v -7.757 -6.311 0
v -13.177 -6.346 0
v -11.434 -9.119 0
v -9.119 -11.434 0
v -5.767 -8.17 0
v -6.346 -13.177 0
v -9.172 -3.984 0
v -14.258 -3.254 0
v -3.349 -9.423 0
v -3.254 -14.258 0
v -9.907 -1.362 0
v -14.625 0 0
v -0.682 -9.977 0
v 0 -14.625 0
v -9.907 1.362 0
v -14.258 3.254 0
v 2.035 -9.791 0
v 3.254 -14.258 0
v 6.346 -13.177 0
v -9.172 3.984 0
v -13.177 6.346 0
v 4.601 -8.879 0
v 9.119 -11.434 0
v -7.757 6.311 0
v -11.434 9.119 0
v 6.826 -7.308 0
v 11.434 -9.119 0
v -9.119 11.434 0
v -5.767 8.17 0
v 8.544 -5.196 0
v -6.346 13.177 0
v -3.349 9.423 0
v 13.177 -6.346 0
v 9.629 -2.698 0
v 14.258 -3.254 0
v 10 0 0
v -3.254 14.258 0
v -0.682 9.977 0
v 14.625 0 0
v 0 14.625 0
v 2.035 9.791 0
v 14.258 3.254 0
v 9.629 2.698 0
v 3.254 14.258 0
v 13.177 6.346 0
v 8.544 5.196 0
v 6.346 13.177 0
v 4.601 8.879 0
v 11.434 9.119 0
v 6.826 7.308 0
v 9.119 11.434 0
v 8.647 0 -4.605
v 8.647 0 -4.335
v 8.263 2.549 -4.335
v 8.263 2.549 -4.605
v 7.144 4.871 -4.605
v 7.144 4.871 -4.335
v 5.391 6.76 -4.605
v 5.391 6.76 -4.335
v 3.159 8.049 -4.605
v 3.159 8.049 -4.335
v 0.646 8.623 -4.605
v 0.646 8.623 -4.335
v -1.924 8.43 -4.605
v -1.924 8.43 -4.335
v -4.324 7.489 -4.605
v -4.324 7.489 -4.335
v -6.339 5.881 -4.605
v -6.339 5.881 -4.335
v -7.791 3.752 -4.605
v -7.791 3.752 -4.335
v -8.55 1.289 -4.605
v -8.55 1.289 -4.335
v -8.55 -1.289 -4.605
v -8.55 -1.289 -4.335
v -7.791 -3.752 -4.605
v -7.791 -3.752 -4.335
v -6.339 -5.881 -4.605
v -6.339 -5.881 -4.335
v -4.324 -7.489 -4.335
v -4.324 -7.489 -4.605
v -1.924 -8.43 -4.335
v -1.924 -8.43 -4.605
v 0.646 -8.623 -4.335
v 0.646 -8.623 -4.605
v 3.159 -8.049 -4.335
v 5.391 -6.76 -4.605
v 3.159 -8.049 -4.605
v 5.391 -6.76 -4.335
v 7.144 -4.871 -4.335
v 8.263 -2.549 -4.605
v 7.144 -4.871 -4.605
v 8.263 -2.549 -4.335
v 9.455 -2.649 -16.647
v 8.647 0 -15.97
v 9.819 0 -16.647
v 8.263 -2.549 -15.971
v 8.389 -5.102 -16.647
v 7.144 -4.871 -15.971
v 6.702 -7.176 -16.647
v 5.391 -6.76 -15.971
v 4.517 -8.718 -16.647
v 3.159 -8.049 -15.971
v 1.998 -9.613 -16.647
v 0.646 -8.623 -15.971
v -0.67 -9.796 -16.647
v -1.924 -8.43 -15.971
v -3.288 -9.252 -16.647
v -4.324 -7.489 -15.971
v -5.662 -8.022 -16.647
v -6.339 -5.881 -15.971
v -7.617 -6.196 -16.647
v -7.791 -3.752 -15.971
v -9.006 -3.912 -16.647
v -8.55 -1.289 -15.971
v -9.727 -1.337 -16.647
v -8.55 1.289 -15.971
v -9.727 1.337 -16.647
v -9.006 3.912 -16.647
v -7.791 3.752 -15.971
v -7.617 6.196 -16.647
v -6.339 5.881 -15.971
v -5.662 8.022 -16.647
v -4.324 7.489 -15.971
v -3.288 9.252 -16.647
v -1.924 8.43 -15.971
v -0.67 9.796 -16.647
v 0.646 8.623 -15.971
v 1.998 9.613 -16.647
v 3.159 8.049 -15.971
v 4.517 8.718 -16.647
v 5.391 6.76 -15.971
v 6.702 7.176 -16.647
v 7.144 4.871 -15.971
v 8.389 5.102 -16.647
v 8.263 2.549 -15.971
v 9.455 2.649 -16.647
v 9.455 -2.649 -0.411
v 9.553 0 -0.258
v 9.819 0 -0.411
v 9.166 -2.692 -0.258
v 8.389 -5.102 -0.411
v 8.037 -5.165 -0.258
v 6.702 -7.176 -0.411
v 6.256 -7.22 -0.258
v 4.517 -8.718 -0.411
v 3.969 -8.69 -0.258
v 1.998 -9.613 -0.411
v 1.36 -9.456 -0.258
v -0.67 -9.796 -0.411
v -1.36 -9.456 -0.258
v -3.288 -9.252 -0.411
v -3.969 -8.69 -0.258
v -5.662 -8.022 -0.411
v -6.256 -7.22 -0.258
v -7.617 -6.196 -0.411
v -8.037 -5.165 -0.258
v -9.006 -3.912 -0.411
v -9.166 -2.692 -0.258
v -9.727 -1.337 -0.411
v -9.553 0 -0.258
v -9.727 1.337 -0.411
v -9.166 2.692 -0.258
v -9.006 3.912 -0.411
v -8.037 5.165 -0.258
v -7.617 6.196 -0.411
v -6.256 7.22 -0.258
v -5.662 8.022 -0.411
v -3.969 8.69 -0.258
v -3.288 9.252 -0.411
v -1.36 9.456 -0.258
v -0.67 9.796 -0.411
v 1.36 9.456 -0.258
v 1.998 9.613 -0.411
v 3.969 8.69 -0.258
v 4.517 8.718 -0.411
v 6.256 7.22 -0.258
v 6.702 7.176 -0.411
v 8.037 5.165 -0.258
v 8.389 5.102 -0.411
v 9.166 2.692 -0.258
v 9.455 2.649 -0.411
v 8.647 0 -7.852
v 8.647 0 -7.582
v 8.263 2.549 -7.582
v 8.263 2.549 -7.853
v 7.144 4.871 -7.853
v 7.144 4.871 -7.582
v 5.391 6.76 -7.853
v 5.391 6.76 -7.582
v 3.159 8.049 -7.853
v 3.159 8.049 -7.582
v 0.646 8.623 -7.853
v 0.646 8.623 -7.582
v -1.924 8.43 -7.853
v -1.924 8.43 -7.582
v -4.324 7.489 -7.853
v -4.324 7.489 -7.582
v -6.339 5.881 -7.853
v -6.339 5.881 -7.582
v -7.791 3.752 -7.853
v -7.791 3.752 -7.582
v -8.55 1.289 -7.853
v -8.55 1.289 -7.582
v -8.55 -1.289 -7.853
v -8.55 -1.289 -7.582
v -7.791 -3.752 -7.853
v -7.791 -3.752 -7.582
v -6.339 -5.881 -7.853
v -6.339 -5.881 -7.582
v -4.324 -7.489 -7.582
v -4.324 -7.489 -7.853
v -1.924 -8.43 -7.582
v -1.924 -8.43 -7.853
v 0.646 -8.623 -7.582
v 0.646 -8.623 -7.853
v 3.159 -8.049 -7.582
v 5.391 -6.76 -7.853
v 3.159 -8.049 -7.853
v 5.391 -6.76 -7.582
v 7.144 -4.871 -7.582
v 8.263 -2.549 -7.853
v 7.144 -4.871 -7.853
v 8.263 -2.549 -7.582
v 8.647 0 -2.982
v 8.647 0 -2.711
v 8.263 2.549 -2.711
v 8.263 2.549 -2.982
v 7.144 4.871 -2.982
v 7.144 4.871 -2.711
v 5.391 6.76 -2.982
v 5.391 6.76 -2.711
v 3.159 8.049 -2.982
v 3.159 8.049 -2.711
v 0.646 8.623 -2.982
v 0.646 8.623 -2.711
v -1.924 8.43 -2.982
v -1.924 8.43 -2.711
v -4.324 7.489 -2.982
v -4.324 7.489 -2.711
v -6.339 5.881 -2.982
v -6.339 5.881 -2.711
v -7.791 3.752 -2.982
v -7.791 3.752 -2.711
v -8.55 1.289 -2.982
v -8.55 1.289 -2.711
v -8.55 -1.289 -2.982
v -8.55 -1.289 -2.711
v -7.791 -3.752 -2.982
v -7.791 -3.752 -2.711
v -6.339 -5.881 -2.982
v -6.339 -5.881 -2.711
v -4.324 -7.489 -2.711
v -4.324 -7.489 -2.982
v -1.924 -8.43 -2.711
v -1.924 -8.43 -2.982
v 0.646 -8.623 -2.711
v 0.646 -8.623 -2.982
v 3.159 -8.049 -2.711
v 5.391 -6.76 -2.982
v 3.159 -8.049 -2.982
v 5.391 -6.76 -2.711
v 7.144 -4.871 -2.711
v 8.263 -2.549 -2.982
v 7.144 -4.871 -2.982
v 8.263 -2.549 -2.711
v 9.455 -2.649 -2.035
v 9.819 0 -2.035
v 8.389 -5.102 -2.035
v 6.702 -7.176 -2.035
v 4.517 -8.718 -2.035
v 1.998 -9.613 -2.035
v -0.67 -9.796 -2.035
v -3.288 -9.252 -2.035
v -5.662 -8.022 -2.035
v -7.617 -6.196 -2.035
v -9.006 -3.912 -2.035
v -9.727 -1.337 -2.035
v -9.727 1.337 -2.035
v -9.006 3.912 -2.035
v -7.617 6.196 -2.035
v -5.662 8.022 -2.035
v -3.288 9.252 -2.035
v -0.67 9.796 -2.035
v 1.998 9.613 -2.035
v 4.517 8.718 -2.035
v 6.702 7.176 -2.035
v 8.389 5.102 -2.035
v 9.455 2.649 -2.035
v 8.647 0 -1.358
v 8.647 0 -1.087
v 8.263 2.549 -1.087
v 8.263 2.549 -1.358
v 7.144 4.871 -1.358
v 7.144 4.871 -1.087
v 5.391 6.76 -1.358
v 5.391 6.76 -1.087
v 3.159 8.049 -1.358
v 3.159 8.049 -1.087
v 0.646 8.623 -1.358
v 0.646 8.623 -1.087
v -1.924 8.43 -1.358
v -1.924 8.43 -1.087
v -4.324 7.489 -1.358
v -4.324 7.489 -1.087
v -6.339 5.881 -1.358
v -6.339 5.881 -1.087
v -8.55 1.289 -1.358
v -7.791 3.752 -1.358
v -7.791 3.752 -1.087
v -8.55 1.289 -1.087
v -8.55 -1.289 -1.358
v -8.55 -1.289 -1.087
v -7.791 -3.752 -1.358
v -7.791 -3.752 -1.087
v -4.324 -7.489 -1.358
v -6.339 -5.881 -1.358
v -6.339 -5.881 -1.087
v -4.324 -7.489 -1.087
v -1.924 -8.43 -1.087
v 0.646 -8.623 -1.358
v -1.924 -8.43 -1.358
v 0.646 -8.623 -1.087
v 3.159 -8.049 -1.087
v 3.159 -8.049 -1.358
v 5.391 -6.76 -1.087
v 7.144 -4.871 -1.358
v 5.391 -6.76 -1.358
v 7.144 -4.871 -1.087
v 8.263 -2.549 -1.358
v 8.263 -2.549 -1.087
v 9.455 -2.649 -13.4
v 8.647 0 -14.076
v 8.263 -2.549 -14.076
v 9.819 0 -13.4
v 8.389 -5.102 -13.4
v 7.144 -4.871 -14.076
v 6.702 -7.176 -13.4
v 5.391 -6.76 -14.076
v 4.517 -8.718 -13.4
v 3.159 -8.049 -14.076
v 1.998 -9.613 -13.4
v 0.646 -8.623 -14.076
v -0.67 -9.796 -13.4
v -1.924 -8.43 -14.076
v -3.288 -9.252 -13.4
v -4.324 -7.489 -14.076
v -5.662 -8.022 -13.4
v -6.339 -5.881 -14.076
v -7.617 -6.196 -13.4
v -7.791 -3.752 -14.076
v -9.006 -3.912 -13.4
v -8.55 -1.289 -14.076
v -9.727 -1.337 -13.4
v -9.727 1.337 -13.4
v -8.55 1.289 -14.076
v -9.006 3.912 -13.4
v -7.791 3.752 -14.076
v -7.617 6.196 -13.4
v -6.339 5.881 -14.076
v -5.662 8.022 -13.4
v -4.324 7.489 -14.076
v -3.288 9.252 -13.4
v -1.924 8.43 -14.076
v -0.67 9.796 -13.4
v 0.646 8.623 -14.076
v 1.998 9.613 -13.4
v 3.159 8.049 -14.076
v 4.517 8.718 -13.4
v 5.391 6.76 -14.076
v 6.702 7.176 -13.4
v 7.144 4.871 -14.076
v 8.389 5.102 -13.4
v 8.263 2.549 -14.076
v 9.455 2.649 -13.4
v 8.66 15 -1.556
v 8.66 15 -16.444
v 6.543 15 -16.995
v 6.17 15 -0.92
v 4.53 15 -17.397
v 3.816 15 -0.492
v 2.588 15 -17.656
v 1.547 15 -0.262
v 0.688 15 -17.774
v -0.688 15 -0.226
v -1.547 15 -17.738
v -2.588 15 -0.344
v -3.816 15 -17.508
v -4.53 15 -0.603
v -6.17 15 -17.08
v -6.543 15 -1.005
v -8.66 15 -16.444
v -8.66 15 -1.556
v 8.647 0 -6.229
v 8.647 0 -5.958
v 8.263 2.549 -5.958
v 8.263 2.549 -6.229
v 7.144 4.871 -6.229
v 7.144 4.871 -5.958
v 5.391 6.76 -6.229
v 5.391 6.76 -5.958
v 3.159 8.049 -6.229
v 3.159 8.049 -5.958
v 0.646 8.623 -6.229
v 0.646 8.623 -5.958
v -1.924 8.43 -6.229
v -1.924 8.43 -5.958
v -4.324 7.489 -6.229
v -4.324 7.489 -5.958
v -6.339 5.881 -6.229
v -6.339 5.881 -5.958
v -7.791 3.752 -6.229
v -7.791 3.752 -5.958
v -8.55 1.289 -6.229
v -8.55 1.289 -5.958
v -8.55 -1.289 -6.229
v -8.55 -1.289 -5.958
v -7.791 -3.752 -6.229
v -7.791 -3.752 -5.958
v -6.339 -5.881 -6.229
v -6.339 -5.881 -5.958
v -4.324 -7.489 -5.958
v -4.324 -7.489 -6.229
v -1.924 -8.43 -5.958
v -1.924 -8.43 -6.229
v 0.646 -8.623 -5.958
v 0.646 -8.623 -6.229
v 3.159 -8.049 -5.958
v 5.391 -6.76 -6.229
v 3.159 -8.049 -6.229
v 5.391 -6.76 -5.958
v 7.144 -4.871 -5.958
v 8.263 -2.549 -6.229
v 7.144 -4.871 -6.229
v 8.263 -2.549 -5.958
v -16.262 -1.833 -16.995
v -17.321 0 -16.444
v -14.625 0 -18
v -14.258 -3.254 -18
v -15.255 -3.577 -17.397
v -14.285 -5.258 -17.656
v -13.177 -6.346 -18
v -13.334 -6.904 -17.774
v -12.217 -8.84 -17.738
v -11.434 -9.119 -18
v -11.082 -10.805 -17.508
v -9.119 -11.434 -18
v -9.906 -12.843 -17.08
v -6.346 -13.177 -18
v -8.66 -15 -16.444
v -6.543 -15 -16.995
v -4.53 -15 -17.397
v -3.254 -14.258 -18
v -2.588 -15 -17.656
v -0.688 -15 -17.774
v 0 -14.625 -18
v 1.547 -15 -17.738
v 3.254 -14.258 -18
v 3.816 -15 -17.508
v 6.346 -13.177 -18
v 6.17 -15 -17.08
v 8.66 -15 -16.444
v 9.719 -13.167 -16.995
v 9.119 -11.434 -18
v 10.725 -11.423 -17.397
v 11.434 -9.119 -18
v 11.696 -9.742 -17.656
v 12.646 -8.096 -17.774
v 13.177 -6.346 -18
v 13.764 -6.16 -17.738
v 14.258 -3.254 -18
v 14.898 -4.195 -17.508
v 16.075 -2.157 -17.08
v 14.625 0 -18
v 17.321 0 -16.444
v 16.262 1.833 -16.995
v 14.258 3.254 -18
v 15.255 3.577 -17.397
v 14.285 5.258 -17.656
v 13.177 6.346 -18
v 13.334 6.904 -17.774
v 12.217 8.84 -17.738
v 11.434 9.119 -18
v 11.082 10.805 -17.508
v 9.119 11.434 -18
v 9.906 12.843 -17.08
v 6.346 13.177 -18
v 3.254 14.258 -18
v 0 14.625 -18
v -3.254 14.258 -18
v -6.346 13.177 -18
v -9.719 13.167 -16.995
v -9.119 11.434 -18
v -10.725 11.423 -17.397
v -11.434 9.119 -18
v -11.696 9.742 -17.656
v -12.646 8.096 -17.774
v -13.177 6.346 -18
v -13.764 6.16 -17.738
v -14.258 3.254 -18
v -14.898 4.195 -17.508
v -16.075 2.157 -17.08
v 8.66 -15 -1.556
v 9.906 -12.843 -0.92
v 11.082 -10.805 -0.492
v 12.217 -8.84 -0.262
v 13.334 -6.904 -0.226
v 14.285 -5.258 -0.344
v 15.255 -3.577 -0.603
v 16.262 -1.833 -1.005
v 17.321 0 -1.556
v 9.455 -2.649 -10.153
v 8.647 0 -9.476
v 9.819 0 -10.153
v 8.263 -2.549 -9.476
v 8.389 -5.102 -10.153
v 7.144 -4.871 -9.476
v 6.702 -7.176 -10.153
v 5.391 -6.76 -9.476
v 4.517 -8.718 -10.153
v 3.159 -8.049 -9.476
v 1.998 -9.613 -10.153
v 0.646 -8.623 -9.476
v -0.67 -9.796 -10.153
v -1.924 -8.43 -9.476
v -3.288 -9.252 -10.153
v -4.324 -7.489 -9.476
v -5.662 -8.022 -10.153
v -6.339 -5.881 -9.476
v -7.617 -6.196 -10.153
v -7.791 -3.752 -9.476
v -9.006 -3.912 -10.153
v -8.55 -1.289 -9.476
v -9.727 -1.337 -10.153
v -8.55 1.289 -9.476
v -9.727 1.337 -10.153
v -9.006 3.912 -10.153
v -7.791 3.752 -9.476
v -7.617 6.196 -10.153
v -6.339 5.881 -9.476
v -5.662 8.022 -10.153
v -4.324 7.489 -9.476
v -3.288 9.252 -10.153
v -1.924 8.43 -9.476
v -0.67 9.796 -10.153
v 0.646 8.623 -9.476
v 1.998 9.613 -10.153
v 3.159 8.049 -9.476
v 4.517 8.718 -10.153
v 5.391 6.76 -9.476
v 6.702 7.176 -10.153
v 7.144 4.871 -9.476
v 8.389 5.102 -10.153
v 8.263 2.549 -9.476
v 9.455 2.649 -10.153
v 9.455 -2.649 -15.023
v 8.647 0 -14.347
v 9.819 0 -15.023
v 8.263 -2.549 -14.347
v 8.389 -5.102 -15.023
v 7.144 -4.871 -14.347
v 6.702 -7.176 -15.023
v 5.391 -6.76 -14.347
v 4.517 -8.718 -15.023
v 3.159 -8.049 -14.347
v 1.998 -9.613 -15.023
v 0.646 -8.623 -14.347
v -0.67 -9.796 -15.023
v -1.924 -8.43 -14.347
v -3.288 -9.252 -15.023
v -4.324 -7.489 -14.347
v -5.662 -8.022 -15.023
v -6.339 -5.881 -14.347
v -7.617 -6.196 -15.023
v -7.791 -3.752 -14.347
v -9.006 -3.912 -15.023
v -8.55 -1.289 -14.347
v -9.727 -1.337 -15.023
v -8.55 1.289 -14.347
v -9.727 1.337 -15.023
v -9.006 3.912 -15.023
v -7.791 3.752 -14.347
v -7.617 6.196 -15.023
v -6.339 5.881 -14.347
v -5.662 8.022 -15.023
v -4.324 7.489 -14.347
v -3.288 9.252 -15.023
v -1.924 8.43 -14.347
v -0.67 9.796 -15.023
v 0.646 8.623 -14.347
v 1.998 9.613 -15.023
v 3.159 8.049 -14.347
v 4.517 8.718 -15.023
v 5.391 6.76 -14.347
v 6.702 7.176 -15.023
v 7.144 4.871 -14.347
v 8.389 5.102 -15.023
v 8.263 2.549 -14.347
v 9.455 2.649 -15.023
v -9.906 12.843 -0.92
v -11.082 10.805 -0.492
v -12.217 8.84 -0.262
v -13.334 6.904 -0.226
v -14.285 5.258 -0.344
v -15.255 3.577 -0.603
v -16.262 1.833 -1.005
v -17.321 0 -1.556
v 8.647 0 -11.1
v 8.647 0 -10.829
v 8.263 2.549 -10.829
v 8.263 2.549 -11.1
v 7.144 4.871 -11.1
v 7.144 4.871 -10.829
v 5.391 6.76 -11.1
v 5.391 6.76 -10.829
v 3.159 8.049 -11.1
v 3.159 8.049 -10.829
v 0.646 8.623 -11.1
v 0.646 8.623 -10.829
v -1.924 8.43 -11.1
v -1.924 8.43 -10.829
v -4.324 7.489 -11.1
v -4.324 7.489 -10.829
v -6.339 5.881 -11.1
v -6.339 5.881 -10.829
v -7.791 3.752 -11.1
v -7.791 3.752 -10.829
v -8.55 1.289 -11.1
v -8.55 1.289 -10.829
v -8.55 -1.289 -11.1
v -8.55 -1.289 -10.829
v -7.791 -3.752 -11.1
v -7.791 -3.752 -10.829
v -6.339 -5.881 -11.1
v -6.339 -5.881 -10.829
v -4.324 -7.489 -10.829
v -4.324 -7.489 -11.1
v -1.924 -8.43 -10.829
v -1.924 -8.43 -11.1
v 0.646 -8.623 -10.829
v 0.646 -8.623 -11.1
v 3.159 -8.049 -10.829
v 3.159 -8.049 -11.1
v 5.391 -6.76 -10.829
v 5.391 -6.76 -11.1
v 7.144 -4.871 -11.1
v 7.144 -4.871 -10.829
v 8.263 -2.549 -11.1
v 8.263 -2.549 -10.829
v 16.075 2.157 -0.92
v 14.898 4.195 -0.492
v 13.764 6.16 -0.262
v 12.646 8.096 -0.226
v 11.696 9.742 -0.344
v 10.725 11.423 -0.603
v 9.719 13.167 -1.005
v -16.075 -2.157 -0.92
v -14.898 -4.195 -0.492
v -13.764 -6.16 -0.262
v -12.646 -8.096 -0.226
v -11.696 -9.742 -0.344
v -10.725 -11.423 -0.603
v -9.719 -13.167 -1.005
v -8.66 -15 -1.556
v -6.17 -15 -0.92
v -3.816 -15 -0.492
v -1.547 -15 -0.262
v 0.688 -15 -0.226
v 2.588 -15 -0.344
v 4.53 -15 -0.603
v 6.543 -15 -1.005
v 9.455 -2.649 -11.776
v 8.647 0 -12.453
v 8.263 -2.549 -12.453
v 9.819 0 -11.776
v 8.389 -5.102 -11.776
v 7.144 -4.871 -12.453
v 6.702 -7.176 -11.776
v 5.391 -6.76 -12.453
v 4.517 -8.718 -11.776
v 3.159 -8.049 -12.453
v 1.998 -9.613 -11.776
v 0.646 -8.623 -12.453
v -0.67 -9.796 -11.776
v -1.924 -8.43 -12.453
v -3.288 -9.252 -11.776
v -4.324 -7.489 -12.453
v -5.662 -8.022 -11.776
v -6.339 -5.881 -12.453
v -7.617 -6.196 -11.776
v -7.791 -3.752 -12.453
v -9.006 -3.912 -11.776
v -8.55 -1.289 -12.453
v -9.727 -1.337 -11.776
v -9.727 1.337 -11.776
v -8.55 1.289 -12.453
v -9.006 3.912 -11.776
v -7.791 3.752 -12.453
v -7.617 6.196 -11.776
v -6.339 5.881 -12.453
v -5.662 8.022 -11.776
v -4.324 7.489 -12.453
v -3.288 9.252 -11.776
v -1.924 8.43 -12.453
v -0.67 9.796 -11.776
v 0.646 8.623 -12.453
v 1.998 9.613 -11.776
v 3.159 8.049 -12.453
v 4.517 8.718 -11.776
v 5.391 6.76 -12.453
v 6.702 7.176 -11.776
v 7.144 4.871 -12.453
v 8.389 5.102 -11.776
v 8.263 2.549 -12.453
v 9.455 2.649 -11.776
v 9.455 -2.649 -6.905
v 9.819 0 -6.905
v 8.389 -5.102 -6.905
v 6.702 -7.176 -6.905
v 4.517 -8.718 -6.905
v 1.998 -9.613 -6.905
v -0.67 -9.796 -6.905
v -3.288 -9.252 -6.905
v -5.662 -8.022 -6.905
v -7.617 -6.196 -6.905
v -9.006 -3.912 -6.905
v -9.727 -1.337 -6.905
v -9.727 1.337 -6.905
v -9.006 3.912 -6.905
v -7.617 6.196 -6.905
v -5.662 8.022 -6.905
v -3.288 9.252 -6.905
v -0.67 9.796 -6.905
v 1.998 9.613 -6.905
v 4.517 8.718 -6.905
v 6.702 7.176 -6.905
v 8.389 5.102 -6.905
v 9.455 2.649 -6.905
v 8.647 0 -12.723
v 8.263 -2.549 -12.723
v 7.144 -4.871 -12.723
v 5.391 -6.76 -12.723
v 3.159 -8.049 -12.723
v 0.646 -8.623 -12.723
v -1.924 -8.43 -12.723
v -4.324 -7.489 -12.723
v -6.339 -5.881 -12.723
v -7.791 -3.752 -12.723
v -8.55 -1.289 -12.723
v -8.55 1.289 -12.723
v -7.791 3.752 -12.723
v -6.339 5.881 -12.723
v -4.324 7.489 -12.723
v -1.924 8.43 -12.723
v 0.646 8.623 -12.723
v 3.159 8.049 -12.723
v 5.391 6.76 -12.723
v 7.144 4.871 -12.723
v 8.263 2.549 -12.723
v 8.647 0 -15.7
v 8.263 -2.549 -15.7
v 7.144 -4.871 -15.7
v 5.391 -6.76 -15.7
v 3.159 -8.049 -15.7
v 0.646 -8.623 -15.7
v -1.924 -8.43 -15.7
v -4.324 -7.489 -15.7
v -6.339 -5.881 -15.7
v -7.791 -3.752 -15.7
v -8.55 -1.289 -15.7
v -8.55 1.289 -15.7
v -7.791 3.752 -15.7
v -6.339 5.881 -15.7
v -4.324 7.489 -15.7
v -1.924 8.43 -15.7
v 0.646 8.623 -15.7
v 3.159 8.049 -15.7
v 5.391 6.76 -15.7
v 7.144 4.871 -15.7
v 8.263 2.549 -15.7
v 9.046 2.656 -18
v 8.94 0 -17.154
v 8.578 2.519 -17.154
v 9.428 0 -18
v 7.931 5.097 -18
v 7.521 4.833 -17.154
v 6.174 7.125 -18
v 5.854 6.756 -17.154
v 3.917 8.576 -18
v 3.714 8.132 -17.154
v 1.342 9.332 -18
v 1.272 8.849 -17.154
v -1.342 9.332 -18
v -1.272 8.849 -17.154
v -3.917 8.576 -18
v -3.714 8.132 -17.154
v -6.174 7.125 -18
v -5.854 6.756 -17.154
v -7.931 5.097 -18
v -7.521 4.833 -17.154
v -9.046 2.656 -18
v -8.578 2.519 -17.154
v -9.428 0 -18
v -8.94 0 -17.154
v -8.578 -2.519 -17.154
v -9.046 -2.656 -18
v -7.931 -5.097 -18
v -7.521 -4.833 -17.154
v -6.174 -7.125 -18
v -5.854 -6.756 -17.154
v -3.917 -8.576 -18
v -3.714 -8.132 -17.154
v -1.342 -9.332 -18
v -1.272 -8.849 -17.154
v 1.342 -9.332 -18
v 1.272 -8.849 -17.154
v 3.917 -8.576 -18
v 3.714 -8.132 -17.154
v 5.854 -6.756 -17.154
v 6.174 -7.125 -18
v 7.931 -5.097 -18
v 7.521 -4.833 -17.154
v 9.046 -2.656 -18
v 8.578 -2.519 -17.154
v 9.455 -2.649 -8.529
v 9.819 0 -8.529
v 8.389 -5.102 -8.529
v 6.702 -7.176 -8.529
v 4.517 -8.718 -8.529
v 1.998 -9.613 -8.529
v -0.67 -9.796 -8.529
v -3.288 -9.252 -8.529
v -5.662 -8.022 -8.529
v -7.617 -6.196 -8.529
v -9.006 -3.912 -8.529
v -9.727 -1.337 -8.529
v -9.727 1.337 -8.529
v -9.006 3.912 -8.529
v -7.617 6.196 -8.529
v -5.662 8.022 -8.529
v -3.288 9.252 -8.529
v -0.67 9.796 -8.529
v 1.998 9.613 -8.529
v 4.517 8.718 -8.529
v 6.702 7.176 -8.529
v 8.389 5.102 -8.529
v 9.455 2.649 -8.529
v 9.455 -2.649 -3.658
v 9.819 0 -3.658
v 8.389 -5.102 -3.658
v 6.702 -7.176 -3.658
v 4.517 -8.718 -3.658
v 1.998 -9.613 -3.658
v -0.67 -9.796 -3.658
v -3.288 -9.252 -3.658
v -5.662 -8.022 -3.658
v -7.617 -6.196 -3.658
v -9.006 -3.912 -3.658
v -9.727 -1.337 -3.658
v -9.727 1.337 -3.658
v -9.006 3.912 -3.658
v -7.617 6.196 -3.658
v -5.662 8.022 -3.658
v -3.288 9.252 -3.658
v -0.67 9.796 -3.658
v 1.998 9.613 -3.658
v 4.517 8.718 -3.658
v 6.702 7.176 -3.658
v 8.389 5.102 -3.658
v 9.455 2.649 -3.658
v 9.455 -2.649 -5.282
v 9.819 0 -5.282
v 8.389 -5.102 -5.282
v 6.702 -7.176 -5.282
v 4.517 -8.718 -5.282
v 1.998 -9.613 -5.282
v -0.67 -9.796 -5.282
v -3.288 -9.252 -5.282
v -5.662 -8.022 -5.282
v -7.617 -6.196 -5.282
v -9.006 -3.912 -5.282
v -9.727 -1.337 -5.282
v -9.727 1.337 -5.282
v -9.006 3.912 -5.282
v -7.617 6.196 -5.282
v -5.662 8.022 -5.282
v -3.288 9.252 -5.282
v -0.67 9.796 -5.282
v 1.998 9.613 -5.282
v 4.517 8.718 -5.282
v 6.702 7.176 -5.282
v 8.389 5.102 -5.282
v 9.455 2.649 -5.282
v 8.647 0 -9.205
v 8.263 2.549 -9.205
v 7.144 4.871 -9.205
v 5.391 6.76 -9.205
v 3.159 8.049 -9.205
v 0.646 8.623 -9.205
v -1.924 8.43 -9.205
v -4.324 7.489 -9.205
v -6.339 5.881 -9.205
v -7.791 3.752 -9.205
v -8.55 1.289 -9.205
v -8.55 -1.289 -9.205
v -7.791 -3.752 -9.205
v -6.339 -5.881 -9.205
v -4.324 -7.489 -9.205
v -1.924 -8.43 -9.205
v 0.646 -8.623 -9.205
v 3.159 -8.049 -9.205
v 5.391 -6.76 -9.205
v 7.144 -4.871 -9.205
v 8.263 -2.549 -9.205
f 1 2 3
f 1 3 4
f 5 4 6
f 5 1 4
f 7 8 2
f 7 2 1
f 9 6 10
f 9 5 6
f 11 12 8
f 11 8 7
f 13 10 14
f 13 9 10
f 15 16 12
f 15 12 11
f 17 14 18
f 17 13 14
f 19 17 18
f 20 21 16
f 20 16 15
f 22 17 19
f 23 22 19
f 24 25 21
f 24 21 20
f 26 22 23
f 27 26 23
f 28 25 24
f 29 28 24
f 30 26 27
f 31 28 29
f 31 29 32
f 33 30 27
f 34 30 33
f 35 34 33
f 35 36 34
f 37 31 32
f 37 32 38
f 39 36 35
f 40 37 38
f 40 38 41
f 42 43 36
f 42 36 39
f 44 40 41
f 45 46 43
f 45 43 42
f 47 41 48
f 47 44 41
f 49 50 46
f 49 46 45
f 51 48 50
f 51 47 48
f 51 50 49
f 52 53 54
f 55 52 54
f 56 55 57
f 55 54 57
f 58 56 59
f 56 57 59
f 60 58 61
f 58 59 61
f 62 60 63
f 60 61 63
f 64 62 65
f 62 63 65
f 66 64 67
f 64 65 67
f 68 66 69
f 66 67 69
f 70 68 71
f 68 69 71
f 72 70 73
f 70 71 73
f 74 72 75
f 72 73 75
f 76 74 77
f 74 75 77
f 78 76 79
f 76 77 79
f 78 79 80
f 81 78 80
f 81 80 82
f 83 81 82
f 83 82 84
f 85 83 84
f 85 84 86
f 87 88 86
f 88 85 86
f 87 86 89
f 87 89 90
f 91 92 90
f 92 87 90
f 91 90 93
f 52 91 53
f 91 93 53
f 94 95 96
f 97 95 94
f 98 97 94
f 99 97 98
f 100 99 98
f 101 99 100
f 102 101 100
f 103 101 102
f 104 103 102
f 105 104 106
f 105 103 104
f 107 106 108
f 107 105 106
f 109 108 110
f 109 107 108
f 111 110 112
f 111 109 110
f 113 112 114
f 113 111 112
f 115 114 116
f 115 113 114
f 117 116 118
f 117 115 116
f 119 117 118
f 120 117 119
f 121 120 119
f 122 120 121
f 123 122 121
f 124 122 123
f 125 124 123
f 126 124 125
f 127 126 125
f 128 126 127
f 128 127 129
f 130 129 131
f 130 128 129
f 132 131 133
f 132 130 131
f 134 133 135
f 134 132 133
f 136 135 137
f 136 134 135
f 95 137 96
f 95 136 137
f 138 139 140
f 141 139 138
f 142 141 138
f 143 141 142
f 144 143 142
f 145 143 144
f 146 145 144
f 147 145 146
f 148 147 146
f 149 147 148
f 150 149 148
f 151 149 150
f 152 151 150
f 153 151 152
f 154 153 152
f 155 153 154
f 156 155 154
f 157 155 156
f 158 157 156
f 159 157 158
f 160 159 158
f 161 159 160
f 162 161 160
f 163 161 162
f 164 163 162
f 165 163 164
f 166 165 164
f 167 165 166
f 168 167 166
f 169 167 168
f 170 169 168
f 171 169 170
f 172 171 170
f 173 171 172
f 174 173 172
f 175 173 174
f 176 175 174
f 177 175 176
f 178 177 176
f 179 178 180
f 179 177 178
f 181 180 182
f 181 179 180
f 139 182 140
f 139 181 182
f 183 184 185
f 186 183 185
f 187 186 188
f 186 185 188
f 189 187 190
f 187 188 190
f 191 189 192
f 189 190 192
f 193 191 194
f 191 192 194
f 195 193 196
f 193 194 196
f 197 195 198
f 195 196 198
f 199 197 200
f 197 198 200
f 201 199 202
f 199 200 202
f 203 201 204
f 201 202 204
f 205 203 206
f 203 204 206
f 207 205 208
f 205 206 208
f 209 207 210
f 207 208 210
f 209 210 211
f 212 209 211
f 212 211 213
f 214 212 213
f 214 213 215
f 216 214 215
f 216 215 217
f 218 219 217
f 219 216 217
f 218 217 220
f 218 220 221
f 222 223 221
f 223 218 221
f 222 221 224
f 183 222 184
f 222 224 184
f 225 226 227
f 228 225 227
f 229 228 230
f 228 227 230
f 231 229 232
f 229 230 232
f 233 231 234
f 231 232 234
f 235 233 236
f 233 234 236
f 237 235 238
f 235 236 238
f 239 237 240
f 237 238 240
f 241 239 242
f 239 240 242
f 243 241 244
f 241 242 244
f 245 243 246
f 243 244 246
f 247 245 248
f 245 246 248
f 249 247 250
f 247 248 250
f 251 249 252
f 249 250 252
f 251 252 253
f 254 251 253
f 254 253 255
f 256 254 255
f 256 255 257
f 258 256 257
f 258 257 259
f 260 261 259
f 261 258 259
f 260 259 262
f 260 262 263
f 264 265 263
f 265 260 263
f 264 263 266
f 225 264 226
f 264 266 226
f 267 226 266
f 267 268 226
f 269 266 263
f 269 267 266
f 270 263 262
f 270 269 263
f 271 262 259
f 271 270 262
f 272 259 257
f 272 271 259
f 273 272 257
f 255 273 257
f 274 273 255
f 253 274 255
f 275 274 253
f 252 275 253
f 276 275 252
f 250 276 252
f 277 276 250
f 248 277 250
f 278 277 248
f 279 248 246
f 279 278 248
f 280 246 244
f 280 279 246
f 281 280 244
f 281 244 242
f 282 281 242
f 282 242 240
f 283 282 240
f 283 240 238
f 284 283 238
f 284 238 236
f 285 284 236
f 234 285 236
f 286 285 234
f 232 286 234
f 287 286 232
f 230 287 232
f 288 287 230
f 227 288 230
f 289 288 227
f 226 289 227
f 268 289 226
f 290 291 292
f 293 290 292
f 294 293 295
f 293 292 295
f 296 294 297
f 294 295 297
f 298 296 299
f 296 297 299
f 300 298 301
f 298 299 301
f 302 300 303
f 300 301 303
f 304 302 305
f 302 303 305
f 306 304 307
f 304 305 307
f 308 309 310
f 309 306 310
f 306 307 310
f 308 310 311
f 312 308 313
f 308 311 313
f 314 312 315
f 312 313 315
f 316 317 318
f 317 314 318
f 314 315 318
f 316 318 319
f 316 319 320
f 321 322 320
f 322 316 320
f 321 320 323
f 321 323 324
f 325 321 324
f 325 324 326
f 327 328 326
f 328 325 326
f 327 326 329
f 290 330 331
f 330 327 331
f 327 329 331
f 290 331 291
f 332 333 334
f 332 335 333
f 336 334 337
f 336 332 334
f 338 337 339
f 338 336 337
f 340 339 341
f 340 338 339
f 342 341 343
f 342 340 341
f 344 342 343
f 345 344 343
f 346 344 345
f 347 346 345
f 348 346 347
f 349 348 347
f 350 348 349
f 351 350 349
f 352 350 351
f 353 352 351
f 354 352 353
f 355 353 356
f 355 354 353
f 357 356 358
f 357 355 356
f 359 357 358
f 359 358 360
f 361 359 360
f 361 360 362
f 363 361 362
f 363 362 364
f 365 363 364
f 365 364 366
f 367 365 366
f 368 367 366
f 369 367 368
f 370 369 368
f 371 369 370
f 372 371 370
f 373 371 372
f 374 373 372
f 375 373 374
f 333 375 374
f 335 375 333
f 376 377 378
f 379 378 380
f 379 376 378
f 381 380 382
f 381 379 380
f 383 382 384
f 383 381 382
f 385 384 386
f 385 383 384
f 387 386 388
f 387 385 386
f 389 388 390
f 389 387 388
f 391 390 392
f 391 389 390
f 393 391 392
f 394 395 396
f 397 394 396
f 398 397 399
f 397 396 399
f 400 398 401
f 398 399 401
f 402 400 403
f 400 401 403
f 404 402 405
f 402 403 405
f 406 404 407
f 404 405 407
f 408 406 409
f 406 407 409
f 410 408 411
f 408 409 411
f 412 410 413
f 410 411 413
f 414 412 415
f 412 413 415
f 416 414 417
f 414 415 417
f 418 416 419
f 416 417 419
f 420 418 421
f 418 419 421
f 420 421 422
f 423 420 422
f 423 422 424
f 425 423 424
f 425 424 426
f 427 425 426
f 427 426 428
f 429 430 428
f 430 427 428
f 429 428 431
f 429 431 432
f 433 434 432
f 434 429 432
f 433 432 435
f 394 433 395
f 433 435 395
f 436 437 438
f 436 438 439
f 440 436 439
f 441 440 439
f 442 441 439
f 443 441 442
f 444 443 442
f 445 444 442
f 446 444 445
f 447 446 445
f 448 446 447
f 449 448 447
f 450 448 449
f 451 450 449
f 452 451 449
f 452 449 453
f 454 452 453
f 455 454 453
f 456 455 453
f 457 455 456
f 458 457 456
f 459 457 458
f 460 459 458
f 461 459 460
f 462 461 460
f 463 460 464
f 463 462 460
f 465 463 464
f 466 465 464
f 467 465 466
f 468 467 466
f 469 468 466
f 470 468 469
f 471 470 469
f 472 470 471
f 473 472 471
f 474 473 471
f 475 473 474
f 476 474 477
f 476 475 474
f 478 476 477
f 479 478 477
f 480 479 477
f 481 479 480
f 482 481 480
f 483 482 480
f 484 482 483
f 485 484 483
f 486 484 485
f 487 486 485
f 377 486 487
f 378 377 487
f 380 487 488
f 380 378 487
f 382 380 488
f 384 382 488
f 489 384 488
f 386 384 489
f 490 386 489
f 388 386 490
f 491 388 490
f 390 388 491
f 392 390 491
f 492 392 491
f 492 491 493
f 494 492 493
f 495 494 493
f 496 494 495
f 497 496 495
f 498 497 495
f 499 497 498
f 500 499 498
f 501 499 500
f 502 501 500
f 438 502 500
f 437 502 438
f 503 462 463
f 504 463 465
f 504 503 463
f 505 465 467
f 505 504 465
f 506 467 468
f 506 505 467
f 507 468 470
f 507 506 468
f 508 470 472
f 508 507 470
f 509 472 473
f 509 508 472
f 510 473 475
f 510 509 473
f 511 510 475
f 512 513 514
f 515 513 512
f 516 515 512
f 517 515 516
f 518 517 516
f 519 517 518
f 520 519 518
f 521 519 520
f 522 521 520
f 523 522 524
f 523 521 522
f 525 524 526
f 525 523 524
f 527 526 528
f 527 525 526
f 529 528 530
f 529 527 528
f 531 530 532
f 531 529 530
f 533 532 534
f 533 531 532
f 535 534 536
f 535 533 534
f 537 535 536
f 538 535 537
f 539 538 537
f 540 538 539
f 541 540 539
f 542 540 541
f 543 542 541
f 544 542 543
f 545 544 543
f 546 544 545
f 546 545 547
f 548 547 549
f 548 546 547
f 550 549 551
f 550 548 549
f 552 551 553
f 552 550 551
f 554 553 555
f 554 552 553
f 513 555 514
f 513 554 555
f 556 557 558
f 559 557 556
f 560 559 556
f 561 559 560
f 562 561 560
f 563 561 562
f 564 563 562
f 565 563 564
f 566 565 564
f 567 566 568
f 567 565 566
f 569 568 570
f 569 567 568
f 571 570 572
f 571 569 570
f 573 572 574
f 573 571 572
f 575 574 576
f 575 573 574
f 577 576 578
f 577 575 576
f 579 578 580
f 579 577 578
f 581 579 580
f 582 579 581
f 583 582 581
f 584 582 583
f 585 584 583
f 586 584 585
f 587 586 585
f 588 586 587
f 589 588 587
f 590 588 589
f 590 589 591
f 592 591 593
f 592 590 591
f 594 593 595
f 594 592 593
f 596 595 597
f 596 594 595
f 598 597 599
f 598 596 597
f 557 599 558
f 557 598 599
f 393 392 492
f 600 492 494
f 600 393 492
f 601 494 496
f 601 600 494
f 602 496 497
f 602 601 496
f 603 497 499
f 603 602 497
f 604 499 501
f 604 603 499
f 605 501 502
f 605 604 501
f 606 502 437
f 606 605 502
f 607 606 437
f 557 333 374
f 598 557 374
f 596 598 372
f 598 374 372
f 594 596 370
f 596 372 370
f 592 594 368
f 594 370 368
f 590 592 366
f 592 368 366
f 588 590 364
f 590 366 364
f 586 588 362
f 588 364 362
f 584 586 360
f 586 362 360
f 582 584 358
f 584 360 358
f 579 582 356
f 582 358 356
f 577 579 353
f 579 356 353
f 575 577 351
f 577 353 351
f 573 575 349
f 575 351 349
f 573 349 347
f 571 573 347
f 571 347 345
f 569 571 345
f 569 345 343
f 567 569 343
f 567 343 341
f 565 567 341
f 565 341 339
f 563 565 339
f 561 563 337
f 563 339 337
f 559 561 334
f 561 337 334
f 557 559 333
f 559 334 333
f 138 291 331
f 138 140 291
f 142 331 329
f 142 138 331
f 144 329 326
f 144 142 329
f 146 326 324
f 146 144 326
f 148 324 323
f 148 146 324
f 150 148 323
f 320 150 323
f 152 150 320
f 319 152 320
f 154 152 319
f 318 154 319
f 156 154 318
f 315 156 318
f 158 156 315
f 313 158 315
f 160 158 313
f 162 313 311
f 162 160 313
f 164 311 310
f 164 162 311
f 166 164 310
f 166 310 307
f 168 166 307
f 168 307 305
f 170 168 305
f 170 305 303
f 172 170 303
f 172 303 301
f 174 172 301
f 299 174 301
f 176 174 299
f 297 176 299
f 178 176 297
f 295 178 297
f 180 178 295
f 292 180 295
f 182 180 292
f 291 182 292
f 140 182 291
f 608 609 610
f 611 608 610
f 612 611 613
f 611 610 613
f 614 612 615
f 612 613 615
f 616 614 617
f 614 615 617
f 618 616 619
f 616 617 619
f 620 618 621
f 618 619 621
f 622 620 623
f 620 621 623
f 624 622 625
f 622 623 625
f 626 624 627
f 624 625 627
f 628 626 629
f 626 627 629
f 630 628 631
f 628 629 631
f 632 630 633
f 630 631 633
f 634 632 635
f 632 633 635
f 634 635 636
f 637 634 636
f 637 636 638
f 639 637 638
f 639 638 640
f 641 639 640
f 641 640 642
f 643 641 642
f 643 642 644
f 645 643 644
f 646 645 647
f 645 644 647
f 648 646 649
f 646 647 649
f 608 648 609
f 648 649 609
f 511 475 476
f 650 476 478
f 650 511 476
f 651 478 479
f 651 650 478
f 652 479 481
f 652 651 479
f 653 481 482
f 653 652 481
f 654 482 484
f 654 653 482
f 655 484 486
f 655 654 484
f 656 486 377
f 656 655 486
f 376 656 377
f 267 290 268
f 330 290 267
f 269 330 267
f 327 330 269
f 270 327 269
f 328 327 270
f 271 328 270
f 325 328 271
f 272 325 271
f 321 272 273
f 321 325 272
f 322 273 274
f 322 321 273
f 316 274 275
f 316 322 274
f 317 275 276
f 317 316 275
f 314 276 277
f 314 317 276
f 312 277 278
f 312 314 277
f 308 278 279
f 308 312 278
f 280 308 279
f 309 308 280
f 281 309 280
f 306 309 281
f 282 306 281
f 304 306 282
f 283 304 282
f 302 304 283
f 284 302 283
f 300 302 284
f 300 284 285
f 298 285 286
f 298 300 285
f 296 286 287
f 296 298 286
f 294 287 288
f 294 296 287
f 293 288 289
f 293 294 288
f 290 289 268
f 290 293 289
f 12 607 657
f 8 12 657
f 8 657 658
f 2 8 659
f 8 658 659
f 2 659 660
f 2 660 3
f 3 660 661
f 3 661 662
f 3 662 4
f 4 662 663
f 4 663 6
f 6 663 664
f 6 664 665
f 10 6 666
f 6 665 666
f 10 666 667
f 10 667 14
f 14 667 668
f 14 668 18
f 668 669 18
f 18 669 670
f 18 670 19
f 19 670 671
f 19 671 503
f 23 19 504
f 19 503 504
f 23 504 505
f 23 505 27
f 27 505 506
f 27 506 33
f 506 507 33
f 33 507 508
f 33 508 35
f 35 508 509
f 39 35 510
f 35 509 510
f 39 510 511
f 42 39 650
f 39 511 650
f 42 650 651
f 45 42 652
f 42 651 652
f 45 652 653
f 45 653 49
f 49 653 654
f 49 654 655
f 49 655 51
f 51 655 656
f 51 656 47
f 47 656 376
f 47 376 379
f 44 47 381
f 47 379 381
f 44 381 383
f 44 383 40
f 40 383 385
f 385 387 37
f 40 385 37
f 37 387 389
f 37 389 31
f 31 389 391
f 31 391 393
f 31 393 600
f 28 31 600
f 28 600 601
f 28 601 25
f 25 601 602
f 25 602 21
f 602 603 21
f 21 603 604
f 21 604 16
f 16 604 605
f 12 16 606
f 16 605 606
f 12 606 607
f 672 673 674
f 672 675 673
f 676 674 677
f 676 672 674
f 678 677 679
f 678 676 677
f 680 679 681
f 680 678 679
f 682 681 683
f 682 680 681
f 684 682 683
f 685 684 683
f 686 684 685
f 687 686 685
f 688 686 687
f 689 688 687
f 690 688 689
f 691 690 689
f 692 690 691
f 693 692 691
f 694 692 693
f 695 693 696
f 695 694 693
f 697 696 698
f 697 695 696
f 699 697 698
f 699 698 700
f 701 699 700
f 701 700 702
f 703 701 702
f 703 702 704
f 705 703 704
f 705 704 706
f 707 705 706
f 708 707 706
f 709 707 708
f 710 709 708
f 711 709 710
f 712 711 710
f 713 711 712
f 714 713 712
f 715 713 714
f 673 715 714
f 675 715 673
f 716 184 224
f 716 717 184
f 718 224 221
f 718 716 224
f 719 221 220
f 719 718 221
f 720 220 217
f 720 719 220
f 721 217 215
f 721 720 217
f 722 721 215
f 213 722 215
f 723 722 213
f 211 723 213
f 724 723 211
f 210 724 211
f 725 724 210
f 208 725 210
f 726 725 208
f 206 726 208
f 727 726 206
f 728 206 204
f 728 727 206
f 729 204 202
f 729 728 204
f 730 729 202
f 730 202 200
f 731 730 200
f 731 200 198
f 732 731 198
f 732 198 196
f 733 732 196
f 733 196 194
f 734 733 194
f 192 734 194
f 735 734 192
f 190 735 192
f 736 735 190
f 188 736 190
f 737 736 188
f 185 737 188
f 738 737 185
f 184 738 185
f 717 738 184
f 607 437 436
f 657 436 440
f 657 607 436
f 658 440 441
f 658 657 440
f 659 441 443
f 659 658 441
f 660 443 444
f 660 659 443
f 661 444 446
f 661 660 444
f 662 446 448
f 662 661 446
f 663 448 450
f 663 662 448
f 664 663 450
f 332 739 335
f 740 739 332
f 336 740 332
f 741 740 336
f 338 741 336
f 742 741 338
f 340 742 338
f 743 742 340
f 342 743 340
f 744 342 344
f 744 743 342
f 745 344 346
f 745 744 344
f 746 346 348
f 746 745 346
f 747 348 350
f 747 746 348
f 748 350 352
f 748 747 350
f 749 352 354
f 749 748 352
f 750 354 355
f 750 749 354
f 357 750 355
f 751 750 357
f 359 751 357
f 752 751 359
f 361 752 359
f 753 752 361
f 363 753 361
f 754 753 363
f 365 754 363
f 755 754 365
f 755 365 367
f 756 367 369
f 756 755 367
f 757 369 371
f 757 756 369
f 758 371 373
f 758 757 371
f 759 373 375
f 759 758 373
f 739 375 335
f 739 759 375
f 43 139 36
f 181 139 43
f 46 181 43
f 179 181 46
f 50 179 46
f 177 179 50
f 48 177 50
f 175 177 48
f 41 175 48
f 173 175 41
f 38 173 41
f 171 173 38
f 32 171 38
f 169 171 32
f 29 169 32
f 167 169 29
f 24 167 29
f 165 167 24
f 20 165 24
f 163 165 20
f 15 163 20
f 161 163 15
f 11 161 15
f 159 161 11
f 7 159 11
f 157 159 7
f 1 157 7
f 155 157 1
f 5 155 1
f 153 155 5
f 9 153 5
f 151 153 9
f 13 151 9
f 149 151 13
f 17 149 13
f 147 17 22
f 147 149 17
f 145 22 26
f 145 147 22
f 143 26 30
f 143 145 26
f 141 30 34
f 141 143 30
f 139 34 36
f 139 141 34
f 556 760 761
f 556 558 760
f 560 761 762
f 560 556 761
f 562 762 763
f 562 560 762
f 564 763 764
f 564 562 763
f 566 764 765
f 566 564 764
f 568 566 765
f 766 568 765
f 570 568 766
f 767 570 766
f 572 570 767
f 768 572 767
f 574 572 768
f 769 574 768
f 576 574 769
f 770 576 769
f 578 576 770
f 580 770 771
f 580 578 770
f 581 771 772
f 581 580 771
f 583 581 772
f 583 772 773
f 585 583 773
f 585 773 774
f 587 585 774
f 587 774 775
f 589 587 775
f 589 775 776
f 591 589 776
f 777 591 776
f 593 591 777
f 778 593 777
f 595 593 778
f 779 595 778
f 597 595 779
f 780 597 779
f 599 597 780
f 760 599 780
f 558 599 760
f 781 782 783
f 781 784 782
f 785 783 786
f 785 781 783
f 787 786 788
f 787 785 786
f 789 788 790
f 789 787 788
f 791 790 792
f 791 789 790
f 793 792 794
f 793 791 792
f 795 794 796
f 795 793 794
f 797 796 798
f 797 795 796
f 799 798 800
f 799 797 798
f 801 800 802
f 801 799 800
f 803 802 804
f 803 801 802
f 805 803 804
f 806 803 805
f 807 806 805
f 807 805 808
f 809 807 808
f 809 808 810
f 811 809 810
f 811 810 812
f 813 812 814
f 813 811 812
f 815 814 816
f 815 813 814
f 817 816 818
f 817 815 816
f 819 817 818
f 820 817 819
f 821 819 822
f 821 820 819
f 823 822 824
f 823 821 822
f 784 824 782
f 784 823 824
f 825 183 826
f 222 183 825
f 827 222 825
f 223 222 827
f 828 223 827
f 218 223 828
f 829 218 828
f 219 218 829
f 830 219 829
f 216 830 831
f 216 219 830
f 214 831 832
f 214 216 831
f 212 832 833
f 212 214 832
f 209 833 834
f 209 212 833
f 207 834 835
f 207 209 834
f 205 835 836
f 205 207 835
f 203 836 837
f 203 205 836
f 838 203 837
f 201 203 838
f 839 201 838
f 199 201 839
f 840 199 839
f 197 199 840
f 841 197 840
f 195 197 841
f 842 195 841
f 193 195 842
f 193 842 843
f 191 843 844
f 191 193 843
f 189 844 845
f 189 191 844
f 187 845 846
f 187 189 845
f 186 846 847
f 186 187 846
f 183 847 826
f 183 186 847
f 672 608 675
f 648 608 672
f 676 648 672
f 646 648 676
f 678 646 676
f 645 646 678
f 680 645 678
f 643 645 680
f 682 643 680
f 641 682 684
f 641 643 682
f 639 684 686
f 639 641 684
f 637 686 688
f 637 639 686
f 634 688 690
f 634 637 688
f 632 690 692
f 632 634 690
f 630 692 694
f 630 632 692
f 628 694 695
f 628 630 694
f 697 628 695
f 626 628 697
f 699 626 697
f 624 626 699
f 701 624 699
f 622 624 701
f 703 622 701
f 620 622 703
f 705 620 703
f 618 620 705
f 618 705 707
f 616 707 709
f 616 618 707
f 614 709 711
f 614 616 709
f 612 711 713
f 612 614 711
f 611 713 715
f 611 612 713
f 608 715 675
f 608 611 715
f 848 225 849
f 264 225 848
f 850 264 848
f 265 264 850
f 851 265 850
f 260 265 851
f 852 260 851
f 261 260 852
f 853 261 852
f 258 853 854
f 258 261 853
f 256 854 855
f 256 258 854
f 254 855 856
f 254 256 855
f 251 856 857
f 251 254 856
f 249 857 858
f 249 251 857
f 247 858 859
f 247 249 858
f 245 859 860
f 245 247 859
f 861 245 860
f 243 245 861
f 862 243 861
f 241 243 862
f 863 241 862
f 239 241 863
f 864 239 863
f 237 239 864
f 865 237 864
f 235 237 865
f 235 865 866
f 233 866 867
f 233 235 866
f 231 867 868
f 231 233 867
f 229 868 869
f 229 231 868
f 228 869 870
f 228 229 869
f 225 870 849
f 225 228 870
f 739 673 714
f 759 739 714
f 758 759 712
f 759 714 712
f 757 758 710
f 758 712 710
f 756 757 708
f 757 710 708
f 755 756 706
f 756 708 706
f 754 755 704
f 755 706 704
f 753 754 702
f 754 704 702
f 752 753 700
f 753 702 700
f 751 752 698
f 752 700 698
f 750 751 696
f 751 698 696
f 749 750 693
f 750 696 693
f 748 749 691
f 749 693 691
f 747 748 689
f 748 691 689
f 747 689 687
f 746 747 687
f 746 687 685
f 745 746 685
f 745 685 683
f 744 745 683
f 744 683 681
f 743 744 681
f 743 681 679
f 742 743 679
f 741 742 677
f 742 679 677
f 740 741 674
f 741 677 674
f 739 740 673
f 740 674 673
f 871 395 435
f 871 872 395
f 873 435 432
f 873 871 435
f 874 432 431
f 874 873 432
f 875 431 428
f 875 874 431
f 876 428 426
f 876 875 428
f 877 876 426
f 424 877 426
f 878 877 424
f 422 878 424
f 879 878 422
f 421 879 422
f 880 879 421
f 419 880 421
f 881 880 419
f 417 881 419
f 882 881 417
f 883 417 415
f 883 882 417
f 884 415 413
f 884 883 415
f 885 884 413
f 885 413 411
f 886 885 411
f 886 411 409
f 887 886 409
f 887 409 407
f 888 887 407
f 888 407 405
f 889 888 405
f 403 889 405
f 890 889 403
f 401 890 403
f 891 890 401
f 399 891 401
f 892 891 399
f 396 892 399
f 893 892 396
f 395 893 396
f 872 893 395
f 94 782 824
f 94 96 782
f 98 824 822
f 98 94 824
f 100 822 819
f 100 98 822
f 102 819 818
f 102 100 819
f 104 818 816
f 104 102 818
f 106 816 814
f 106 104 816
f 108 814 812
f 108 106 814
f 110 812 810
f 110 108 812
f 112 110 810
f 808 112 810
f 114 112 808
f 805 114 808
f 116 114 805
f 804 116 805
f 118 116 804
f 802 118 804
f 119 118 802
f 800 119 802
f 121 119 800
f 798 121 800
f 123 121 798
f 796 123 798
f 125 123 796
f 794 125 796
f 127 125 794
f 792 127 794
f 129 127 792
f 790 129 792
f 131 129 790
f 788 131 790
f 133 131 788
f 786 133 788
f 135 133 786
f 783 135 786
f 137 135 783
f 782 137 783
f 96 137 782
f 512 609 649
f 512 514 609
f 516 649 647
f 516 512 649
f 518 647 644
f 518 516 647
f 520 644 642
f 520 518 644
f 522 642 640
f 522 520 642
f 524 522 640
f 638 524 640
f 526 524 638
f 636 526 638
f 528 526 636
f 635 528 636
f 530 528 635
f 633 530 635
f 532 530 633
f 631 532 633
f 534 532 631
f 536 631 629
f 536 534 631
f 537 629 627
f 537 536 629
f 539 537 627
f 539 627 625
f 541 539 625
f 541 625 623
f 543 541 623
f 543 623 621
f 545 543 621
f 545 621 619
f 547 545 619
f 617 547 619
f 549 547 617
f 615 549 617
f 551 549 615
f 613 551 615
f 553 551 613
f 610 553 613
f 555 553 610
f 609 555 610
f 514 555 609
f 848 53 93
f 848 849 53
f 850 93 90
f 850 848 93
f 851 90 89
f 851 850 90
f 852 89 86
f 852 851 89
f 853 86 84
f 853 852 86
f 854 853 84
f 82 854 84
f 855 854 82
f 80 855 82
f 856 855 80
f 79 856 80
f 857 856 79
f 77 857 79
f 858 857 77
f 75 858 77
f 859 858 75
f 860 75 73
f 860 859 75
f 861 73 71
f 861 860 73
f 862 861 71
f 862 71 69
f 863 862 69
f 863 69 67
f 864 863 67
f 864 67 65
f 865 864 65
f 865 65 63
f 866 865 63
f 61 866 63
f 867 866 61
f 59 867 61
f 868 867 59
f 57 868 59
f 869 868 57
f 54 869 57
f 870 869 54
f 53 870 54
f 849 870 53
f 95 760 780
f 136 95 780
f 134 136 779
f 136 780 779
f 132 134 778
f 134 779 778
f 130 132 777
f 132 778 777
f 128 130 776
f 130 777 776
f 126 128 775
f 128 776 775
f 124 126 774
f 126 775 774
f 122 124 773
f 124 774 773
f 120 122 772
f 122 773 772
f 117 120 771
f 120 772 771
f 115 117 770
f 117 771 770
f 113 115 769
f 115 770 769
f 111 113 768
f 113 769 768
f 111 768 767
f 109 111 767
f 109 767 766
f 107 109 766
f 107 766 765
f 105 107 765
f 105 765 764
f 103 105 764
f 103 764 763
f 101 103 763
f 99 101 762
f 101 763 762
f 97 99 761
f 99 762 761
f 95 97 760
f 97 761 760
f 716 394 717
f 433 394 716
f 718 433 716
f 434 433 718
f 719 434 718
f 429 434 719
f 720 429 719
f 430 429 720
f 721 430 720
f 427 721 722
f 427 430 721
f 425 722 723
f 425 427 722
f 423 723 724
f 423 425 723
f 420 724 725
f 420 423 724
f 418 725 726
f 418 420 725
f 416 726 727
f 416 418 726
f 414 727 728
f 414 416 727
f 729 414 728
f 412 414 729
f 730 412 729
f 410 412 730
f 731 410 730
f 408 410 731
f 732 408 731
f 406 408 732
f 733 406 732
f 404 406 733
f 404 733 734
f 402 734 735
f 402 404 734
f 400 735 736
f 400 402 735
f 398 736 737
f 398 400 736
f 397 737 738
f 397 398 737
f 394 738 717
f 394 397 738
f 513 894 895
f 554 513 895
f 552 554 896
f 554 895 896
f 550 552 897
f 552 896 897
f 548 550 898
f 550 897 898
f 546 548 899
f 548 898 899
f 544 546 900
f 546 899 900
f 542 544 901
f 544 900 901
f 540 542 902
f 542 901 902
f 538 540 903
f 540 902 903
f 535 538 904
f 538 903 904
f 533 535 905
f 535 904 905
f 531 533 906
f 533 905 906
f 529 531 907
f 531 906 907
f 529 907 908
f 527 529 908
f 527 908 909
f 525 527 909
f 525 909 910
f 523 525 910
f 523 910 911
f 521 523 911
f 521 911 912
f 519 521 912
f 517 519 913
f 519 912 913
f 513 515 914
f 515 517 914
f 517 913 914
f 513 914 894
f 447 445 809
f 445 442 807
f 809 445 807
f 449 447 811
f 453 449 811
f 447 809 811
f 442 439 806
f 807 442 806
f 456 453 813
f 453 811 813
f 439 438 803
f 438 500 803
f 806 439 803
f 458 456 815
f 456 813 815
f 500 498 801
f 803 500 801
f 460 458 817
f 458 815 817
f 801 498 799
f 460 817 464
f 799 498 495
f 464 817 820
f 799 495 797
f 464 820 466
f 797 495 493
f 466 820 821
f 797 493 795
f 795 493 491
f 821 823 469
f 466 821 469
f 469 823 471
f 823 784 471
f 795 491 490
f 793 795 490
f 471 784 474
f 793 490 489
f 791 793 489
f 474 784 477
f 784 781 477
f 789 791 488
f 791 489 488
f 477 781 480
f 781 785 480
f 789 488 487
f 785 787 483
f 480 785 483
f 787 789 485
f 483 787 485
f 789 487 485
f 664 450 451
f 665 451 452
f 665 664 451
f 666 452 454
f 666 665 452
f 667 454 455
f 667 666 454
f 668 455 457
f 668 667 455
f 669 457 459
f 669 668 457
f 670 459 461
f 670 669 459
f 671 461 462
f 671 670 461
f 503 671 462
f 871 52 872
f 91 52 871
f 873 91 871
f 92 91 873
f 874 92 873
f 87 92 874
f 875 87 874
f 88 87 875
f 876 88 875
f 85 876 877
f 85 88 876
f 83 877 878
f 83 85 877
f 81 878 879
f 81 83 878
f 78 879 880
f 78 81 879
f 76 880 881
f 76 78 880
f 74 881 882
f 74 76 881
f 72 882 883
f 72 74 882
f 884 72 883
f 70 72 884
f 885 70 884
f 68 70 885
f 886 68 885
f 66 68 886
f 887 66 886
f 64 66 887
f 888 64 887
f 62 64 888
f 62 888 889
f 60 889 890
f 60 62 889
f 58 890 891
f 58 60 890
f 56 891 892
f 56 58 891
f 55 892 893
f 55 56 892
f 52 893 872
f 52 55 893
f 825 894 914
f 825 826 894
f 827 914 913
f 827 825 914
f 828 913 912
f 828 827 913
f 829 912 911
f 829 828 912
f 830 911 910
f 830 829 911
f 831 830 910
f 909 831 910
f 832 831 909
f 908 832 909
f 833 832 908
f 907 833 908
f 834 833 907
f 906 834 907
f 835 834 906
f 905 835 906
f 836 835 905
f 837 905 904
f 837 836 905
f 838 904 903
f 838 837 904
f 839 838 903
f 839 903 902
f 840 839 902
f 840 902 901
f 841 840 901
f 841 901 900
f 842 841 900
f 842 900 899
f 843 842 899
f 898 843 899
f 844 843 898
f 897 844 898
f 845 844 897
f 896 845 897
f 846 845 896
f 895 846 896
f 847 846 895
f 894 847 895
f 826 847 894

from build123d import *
from OCP.BRepFilletAPI import BRepFilletAPI_MakeChamfer

# Parameters (mm, degrees)
SKETCH1_R        = 8.647
BASENUT_DEPTH    = 18
ENDCHAMFER_SIZE  = 1.353
ENDCHAMFER_SIZE2 = 0.781154914
LPATTERN10_COUNT = 11
LPATTERN10_PITCH = 1.6236


with BuildPart() as part:
    # Sketch1 → BaseNut (new body)
    with BuildSketch(Plane.XY):
        Polygon((17.320508076, 0), (8.660254038, 15), (-8.660254038, 15), (-17.320508076, 0), (-8.660254038, -15), (8.660254038, -15), align=None)
        Circle(SKETCH1_R, mode=Mode.SUBTRACT)
    extrude(amount=-BASENUT_DEPTH)

    # Sketch2 → Double-Chamfer (revolve, cut)
    with BuildSketch(Plane(origin=(0, 0, 0), x_dir=(1, 0, 0), z_dir=(0, 1, 0))):
        Polygon((-17.320508076, 18), (-14.625, 18), (-17.320508076, 16.443747687), align=None)
        Polygon((-17.320508076, 1.556252313), (-17.320508076, 0), (-14.625, 0), align=None)
    revolve(axis=Axis((0, 0, -3.375940562), (0, 0, 1)), mode=Mode.SUBTRACT)

    # EndChamfer: one chamfer whose edges measure the first distance from different faces: ONE call of the kernel's chamfer builder (chamfer() names one face for all edges)
    endchamfer_edges_1 = [part.edges().sort_by_distance(p)[0] for p in [
        (-8.647, 0, -18),
    ]]
    endchamfer_side_1 = [part.faces().sort_by_distance(p)[0] for p in [
        (-8.647, 0, -9),
    ]]
    endchamfer_edges_2 = [part.edges().sort_by_distance(p)[0] for p in [
        (-8.647, 0, 0),
    ]]
    endchamfer_side_2 = [part.faces().sort_by_distance(p)[0] for p in [
        (14.211342533, 0, 0),
    ]]
    endchamfer = BRepFilletAPI_MakeChamfer(part.part.solid().wrapped)
    for e in endchamfer_edges_1:
        endchamfer.Add(ENDCHAMFER_SIZE, ENDCHAMFER_SIZE2, e.wrapped, endchamfer_side_1[0].wrapped)  # the first distance lies on this face
    for e in endchamfer_edges_2:
        endchamfer.Add(ENDCHAMFER_SIZE, ENDCHAMFER_SIZE2, e.wrapped, endchamfer_side_2[0].wrapped)  # the first distance lies on this face
    add(Compound.cast(endchamfer.Shape()), mode=Mode.REPLACE)

    # Sketch3 → Cut-Revolve10 (revolve, cut)
    with BuildSketch(Plane(origin=(0, 0, 0), x_dir=(1, 0, 0), z_dir=(0, 1, 0)), mode=Mode.PRIVATE) as cut_revolve10_sk:
        Polygon((-9.818732371, 16.647), (-8.647, 15.9705), (-7.294, 15.9705), (-7.294, 17.3235), (-8.647, 17.3235), align=None)
    cut_revolve10 = revolve(cut_revolve10_sk.sketch.rotate(Axis((0, 0, -7.438254559), (0, 0, -1)), 180), axis=Axis((0, 0, -7.438254559), (0, 0, -1)), mode=Mode.SUBTRACT)

    # LPattern10: Cut-Revolve10 ×11
    with Locations(*[(0, 0, i * LPATTERN10_PITCH) for i in range(1, LPATTERN10_COUNT)]):
        add(cut_revolve10, mode=Mode.SUBTRACT)


solid = part.part
